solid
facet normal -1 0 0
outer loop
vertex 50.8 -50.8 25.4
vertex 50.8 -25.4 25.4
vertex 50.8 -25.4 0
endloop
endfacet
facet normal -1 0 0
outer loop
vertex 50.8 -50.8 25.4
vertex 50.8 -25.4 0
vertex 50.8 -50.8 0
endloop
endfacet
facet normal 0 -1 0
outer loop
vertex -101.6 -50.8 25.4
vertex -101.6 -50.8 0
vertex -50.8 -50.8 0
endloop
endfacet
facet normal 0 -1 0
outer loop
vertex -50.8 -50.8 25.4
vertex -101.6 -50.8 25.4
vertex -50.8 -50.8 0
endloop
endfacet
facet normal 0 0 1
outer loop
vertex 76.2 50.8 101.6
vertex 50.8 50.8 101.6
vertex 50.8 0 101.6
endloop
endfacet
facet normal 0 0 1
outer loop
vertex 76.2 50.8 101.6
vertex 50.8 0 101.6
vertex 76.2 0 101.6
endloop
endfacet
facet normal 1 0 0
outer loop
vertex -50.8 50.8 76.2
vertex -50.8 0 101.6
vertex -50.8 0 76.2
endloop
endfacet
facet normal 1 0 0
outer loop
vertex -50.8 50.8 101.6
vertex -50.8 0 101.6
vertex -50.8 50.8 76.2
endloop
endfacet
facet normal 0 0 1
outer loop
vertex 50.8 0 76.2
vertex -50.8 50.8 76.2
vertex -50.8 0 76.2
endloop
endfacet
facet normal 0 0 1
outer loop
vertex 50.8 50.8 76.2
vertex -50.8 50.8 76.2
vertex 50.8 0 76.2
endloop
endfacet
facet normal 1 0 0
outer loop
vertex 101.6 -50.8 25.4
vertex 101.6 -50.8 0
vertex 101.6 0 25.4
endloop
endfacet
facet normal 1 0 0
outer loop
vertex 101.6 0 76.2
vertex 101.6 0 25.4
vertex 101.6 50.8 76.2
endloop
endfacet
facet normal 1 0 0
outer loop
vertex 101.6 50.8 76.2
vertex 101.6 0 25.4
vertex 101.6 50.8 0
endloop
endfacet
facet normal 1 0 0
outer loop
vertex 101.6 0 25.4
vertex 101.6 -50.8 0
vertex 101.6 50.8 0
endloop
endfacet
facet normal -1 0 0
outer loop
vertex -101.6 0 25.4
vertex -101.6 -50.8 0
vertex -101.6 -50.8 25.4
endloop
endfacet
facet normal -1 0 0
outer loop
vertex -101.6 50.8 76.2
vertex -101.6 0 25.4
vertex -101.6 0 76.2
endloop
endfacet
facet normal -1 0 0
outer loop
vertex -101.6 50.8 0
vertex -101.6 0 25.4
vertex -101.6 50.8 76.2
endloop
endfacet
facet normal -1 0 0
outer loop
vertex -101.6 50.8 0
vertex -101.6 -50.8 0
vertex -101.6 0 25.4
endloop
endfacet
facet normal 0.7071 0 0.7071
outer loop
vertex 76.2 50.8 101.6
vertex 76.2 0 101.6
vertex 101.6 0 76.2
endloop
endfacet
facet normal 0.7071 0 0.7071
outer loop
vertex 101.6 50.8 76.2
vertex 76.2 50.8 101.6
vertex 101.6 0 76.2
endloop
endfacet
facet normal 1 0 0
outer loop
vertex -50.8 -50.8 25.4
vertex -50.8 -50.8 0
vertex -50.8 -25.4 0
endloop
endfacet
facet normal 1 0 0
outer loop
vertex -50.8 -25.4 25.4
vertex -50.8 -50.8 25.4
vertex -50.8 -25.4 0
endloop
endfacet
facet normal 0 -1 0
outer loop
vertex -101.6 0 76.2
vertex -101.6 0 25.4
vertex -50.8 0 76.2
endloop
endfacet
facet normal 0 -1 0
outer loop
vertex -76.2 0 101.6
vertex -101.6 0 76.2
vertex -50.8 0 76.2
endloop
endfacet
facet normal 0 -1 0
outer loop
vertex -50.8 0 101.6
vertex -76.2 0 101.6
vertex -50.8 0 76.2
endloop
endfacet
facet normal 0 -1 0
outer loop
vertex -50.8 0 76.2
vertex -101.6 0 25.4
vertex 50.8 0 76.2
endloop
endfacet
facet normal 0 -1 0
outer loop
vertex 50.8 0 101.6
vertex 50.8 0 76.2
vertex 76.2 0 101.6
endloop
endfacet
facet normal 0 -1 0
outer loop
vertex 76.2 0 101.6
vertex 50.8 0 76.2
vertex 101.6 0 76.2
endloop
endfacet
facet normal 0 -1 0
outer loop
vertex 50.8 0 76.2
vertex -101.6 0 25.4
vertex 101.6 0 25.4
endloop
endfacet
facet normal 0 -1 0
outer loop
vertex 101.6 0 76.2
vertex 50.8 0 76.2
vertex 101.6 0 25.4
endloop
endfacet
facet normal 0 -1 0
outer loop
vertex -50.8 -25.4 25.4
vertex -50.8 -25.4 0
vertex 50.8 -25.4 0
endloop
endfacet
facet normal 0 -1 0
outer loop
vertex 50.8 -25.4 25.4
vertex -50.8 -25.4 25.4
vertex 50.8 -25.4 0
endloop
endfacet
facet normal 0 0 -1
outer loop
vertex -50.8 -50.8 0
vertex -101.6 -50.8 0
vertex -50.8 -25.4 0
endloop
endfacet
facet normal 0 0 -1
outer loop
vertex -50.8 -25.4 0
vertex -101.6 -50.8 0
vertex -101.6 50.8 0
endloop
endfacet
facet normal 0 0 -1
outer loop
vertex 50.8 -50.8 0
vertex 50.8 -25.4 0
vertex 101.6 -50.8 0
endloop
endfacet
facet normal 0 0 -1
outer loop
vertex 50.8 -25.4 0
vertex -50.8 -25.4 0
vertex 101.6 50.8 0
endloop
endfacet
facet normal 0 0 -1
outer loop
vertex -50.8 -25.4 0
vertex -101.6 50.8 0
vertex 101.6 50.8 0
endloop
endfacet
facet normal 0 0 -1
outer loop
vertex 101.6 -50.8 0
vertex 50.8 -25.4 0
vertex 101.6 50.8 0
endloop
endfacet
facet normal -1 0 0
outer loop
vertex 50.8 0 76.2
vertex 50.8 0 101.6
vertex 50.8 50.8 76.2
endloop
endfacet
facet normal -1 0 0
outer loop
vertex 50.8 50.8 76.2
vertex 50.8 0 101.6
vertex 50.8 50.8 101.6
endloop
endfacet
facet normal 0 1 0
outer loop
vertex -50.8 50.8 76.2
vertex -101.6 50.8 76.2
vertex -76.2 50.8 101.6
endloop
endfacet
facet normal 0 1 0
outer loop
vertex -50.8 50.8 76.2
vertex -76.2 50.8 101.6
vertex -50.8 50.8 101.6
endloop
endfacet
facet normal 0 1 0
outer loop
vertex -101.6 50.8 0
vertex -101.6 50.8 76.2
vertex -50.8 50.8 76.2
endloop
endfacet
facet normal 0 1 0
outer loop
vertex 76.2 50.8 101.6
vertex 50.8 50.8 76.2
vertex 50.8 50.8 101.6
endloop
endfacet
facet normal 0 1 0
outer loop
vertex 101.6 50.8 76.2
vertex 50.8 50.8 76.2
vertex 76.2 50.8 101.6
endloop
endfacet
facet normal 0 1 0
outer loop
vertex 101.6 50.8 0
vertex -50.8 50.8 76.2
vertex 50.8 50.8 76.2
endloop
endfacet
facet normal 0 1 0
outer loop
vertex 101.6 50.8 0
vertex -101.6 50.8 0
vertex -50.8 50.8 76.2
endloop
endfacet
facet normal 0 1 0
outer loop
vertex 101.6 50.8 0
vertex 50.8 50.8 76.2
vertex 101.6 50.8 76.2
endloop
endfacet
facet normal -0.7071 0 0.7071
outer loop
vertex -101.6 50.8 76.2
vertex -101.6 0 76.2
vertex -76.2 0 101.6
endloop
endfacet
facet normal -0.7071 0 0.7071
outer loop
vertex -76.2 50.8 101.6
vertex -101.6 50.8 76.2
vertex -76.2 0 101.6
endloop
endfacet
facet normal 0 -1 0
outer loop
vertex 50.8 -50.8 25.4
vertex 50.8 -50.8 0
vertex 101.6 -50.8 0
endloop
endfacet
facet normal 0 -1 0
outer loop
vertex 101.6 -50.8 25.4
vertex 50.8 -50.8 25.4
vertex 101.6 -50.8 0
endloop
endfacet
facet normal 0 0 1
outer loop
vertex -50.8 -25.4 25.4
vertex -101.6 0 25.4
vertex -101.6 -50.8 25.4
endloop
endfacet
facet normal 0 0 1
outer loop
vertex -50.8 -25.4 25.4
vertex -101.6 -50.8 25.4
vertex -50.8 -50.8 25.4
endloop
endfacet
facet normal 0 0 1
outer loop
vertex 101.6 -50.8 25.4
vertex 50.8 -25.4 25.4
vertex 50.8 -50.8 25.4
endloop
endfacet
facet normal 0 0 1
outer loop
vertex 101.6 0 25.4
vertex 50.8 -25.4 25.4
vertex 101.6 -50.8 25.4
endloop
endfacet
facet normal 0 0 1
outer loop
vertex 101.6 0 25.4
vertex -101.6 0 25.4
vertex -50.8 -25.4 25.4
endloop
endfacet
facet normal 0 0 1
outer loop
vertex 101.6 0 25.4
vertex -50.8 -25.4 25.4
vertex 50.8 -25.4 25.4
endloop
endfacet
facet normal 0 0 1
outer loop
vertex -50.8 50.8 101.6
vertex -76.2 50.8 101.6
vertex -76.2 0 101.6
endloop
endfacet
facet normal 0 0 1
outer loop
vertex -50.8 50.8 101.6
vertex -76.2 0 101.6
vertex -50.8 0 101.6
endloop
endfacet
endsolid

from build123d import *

# Parameters (mm, degrees)
F1_DEPTH = 25.4
F2_W     = 203.2
F2_H     = 50.8
F3_DEPTH = 76.2
F4_W     = 101.6
F4_H     = 50.8
F5_DEPTH = 25.4
F7_DEPTH = 50.8
F9_DEPTH = 50.8


with BuildPart() as f1:
    # F0 (on Top) → F1 (new body)
    with BuildSketch(Plane.XY):
        Polygon((101.6, -50.8), (101.6, 50.8), (-101.6, 50.8), (-101.6, -50.8), (-50.8, -50.8), (-50.8, -25.4), (50.8, -25.4), (50.8, -50.8), align=None)
    extrude(amount=F1_DEPTH)

    # F2 (on face) → F3 (join)
    with BuildSketch(Plane.XY.offset(25.4)):
        with Locations((0, 25.4)):
            Rectangle(F2_W, F2_H)
    extrude(amount=F3_DEPTH)

    # F4 (on face) → F5 (cut)
    with BuildSketch(Plane.XY.offset(101.6)):
        with Locations((0, 25.4)):
            Rectangle(F4_W, F4_H)
    extrude(amount=-F5_DEPTH, mode=Mode.SUBTRACT)

    # F6 (on face) → F7 (cut)
    with BuildSketch(Plane.XZ):
        Polygon((101.6, 101.6), (76.2, 101.6), (101.6, 76.2), align=None)
    extrude(amount=-F7_DEPTH, mode=Mode.SUBTRACT)

    # F8 (on face) → F9 (cut)
    with BuildSketch(Plane.XZ):
        Polygon((-101.6, 76.2), (-76.2, 101.6), (-101.6, 101.6), align=None)
    extrude(amount=-F9_DEPTH, mode=Mode.SUBTRACT)


solid = f1.part
